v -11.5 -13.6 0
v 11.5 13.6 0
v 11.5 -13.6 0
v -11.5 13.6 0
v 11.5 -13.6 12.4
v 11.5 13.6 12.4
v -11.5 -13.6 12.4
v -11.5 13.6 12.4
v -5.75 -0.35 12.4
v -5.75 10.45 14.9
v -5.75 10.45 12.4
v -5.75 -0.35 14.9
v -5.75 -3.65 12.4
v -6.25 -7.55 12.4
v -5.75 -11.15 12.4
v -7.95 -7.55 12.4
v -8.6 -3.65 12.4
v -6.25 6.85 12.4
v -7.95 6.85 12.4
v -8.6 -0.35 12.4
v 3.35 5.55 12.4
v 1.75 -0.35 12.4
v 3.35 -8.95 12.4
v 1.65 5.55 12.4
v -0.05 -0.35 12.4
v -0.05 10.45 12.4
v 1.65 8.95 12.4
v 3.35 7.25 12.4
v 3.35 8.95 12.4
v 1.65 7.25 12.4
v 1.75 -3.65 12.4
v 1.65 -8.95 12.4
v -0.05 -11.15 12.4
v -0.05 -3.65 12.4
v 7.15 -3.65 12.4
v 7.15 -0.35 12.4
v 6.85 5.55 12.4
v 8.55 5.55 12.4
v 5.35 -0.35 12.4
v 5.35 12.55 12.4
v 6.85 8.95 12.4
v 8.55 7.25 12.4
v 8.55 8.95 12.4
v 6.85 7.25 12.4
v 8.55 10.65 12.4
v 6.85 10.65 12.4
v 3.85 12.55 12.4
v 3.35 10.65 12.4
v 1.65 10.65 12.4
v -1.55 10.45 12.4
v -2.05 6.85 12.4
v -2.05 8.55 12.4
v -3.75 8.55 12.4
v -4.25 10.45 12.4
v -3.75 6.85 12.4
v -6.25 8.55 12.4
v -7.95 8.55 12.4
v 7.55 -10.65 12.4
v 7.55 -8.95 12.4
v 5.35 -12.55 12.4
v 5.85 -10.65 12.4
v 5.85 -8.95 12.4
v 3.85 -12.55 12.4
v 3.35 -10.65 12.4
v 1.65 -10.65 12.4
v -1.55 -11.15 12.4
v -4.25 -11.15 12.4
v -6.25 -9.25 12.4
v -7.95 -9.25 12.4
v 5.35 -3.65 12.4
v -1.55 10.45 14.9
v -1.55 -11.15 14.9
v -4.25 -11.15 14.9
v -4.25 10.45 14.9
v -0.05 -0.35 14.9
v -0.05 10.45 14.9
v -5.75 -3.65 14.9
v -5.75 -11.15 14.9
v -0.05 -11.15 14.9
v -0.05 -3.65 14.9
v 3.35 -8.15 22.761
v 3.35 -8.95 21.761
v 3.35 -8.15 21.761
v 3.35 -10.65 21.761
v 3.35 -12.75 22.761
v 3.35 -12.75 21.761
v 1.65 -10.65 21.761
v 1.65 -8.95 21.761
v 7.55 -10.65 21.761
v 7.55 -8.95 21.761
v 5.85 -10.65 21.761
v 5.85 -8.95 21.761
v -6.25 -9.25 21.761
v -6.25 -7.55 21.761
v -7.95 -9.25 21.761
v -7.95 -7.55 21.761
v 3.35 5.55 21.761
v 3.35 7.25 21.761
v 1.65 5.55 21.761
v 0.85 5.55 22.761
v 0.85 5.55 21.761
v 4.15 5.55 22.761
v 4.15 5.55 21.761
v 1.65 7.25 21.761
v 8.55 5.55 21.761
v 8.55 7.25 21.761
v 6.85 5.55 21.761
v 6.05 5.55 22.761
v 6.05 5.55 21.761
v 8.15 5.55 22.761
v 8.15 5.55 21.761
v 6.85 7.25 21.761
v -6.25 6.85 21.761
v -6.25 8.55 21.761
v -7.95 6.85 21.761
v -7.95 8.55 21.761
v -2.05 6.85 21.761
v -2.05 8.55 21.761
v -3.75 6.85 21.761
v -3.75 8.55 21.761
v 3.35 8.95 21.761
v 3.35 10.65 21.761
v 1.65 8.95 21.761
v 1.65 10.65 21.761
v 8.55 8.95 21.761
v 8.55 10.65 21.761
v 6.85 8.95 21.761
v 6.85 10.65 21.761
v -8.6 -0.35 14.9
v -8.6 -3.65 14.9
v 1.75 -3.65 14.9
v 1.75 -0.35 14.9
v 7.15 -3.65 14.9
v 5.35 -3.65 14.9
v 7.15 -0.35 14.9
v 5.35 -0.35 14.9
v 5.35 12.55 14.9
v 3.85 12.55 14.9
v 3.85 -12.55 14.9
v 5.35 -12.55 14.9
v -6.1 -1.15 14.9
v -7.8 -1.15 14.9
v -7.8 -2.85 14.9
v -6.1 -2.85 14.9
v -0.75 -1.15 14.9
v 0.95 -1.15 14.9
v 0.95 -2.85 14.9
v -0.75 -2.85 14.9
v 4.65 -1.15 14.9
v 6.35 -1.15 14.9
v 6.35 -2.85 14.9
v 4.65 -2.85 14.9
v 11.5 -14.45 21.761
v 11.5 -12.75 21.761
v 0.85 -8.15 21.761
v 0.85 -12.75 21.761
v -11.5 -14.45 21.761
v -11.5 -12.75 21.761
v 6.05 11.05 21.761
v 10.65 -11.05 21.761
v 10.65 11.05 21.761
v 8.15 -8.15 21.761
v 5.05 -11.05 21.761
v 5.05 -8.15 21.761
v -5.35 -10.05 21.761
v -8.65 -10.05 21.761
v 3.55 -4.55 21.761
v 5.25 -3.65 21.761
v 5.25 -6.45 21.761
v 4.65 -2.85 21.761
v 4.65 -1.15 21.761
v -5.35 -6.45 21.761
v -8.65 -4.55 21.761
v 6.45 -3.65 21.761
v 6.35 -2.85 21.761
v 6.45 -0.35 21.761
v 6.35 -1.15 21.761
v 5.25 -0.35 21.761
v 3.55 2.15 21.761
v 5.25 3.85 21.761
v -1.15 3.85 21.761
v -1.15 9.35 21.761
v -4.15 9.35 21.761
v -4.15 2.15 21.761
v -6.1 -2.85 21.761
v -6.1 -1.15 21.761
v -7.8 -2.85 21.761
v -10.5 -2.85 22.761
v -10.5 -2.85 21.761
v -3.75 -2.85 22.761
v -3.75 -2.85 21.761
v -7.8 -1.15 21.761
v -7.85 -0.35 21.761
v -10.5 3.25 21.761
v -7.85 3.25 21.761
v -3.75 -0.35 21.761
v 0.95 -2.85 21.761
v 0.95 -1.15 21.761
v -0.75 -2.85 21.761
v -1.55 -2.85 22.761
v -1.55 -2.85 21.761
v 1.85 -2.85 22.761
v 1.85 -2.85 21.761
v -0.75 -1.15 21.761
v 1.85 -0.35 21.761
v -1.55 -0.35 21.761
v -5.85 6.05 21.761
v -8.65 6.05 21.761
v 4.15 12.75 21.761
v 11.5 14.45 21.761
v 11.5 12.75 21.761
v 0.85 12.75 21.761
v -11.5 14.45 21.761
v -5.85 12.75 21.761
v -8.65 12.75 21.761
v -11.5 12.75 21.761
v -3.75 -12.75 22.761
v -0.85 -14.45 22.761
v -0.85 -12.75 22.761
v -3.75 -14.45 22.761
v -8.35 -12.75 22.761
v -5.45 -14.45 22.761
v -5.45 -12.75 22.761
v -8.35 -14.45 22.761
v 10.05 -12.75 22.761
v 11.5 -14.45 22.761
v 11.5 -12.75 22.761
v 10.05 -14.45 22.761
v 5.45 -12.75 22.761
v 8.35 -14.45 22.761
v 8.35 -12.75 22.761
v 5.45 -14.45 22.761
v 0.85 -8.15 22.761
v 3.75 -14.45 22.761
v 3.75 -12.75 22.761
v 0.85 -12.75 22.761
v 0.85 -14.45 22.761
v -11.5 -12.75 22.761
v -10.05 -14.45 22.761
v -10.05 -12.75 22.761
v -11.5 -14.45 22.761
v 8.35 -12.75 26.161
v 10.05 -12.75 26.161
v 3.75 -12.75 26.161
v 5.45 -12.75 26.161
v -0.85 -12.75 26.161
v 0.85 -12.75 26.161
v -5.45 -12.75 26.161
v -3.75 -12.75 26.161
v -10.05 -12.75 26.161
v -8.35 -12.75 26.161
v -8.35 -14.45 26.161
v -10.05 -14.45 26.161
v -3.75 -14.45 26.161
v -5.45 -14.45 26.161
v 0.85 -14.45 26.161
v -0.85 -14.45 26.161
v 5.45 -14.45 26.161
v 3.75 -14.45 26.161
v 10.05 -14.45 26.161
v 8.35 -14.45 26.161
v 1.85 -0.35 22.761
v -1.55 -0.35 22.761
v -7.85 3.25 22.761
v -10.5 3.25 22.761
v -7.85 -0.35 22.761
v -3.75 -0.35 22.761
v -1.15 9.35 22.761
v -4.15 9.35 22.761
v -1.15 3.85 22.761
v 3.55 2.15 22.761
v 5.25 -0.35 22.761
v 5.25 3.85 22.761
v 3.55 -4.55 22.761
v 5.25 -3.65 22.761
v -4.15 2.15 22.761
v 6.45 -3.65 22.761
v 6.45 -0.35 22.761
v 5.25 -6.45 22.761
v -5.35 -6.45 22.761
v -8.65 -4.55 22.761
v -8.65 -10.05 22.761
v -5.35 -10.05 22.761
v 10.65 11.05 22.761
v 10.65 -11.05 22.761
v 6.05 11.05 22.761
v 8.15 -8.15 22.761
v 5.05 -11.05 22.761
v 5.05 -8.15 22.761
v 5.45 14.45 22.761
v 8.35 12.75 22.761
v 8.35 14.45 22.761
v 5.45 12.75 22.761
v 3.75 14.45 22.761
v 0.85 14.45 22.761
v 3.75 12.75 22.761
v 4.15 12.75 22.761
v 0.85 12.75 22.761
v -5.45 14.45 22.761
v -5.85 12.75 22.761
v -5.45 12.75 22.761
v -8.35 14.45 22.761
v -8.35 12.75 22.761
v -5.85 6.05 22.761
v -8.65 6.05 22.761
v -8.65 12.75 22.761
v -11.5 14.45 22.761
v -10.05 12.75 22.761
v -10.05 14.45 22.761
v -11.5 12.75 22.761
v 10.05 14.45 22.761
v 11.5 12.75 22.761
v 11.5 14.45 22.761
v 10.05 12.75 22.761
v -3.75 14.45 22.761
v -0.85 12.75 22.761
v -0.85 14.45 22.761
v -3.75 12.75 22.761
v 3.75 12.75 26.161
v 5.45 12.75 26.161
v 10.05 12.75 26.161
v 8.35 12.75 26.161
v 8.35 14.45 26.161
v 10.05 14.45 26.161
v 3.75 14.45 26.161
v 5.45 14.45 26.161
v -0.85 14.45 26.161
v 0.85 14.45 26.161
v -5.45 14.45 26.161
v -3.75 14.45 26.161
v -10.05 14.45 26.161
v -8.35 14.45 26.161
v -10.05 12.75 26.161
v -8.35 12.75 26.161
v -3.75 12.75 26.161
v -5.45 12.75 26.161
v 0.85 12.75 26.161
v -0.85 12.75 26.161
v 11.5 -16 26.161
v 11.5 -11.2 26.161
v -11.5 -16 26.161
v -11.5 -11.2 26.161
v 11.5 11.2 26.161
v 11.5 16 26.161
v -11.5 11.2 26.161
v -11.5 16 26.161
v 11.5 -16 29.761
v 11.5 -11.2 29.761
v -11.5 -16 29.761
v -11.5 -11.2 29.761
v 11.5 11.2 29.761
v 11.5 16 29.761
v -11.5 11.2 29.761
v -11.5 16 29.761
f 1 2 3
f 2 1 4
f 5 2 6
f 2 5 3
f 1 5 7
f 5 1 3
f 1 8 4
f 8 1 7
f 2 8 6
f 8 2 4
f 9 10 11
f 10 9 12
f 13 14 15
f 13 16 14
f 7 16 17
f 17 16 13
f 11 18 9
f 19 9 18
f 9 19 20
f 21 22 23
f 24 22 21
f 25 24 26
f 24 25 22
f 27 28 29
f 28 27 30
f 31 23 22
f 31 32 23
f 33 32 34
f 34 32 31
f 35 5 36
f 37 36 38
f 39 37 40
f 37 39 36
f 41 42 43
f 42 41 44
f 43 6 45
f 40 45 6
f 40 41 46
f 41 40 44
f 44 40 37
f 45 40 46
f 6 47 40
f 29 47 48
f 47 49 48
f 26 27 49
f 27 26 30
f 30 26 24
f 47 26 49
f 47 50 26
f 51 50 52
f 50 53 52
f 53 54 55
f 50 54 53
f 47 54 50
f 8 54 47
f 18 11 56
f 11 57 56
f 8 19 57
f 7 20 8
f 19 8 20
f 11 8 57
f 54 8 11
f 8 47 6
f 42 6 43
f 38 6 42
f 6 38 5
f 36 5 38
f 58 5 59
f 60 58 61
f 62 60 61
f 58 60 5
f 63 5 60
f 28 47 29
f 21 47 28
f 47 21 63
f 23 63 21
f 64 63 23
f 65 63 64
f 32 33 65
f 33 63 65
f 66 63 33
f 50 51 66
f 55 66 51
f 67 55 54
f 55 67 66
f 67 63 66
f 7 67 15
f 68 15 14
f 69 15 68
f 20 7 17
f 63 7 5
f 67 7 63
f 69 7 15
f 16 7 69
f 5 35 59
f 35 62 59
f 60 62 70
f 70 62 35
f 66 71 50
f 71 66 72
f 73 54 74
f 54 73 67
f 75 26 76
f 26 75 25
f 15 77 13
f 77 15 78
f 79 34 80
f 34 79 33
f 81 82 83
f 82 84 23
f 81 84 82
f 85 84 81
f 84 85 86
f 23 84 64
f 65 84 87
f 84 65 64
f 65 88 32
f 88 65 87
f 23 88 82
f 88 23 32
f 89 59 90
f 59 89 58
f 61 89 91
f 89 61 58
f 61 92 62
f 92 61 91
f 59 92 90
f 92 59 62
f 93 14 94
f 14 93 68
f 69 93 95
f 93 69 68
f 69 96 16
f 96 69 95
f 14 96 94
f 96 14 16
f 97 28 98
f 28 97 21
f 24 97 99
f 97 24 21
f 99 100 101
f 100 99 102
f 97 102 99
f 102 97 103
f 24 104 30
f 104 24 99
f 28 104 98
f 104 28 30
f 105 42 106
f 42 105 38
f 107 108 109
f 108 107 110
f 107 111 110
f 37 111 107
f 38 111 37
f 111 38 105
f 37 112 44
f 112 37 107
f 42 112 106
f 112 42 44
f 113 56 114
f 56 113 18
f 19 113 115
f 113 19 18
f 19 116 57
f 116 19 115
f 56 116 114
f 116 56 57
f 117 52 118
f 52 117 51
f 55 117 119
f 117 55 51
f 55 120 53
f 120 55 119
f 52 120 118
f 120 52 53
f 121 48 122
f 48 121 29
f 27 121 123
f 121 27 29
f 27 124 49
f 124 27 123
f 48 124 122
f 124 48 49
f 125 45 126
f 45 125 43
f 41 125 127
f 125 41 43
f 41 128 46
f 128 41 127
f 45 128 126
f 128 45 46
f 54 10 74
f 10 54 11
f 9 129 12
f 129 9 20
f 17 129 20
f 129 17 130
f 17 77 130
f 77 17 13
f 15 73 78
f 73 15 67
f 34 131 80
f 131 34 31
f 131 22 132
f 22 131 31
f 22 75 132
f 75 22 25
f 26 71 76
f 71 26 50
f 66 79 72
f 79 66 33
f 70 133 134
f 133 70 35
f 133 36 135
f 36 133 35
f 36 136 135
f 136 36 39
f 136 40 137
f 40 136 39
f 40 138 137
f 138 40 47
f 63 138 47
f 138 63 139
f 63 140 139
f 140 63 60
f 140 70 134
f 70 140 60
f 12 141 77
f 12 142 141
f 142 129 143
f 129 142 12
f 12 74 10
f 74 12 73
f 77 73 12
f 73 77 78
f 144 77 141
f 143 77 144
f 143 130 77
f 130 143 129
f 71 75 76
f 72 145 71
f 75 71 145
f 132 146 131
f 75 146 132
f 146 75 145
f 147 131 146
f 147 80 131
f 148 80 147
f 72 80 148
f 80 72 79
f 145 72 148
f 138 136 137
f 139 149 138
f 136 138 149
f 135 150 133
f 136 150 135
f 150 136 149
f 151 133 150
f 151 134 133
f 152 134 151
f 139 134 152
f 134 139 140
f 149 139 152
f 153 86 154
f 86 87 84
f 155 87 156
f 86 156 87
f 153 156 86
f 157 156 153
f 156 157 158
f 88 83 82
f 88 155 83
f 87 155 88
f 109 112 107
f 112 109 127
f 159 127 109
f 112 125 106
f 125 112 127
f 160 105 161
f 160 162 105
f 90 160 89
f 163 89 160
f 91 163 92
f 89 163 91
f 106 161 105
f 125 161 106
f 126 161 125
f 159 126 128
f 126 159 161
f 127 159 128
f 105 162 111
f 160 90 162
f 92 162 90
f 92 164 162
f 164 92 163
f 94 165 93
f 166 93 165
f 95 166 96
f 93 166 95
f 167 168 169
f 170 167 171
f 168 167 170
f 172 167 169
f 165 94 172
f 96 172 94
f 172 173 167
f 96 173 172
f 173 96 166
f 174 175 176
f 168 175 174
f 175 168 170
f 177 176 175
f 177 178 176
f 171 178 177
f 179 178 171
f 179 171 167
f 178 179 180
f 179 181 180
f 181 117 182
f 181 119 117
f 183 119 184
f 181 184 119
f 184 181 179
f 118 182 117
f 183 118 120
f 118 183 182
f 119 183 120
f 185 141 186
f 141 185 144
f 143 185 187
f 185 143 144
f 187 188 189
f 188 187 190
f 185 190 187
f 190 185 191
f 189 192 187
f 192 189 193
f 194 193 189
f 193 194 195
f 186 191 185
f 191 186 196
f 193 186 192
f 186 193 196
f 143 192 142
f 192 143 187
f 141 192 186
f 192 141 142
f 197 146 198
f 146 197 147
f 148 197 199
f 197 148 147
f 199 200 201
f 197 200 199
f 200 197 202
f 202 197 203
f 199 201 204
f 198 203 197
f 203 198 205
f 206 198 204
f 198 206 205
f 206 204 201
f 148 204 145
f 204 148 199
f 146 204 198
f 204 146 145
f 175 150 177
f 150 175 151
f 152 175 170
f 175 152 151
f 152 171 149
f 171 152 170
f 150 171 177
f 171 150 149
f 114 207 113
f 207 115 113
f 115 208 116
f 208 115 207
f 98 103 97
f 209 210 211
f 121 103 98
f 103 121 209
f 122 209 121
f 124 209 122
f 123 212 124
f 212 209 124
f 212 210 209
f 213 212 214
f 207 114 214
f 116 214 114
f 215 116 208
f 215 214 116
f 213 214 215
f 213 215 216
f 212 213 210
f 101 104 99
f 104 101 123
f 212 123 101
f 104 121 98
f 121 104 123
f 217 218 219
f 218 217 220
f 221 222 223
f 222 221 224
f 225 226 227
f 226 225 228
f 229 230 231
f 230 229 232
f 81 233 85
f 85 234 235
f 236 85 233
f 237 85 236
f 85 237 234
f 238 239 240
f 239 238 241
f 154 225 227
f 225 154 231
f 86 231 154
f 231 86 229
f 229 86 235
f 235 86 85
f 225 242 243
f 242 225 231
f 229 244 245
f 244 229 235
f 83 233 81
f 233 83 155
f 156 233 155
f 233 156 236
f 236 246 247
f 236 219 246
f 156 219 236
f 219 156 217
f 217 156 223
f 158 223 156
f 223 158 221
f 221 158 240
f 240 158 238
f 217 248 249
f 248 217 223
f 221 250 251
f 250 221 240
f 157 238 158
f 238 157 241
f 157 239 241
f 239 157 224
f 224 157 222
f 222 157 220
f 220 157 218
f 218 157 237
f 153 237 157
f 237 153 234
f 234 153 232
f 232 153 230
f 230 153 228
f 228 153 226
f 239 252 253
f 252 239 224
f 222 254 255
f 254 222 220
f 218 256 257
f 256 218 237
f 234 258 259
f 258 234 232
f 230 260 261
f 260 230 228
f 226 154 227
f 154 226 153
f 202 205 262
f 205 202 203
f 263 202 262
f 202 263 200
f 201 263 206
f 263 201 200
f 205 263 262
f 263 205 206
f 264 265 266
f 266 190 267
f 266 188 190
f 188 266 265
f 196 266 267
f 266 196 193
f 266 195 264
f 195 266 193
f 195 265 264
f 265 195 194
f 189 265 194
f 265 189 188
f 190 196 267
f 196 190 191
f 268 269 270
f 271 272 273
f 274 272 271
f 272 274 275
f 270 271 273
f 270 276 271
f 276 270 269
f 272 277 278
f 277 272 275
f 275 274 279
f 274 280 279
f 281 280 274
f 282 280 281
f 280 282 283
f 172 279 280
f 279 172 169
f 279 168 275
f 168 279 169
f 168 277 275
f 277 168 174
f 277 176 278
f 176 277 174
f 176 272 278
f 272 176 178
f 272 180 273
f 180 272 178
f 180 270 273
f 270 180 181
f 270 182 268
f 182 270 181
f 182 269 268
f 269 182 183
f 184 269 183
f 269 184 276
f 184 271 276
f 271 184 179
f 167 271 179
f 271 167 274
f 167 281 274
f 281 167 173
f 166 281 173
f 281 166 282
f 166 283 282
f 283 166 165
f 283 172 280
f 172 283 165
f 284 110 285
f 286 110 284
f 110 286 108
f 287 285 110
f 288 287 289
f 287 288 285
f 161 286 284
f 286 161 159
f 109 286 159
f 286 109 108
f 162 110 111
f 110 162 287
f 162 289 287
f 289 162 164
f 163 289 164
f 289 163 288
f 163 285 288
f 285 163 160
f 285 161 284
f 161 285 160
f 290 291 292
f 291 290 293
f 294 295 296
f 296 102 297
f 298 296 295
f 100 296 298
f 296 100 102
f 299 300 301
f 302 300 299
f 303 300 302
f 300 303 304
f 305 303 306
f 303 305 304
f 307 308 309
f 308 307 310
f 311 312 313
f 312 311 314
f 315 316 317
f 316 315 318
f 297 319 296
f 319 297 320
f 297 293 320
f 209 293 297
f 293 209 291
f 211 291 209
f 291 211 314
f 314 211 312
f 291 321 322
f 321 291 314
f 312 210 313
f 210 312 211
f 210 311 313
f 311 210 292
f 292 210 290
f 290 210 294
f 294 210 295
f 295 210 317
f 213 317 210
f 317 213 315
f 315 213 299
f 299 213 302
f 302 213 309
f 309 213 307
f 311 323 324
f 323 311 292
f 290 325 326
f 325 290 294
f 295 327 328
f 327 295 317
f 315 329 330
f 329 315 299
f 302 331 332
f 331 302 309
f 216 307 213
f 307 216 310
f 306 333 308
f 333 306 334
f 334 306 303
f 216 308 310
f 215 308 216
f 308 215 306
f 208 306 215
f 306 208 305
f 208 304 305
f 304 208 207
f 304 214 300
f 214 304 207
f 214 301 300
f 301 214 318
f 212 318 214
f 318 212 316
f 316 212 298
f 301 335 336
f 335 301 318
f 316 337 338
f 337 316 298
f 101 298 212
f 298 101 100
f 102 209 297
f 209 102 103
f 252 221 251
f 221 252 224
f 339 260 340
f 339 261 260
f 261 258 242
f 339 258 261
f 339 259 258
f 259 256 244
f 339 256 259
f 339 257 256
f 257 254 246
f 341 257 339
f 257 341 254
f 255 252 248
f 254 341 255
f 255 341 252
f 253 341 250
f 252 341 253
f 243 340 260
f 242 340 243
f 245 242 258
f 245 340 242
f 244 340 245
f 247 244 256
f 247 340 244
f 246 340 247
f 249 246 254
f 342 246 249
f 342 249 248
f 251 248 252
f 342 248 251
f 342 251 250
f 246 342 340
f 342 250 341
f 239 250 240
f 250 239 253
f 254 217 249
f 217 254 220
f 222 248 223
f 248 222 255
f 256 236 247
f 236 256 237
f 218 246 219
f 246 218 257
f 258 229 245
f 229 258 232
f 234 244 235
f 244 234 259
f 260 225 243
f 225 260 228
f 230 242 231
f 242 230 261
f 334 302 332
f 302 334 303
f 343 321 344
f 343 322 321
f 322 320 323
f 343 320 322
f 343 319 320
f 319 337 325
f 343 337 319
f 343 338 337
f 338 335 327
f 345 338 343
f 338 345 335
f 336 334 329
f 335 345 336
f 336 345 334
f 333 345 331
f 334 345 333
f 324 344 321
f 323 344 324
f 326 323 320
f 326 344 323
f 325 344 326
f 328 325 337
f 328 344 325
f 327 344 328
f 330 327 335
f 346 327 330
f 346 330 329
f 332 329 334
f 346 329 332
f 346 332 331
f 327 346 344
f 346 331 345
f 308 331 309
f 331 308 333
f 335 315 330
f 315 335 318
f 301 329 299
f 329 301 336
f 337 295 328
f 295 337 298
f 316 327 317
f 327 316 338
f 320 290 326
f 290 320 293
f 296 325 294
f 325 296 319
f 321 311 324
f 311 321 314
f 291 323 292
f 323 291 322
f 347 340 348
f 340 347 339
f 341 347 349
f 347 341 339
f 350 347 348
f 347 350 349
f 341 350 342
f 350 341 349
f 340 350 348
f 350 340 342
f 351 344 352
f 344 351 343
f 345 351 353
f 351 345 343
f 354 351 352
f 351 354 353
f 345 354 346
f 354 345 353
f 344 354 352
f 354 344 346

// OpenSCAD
// Generated by SolidPython 0.4.2 on 2020-09-29 23:20:05
//!OpenSCAD

scale(v = 0.0100000000) {
	translate(v = [-1150, -1360, 0]) {
		union() {
			color(c = [0.4000000000, 0.4000000000, 0.4000000000]) {
				translate(v = [0, 0, 0]) {
					linear_extrude(height = 1000.0000000000) {
						polygon(paths = [[0, 1, 2, 3]], points = [[0, 0], [0, 2720], [2300, 2720], [2300, 0]]);
					}
				}
			}
			color(c = [0.2000000000, 0.6000000000, 0.2000000000]) {
				translate(v = [0, 0, 1000.0000000000]) {
					linear_extrude(height = 120.0000000000) {
						polygon(paths = [[0, 1, 2, 3]], points = [[0, 1305], [0, 2720], [2300, 2720], [2300, 1305]]);
					}
				}
			}
			color(c = [0.4000000000, 0.4000000000, 0.4000000000]) {
				translate(v = [0, 0, 1000.0000000000]) {
					linear_extrude(height = 120.0000000000) {
						polygon(paths = [[0, 1, 2, 3]], points = [[0, 0], [0, 1305], [2300, 1305], [2300, 0]]);
					}
				}
			}
			color(c = [0.9000000000, 0.6000000000, 0.6000000000]) {
				translate(v = [0, 0, 1120.0000000000]) {
					linear_extrude(height = 120.0000000000) {
						polygon(paths = [[0, 1, 2, 3]], points = [[295, 1855], [295, 2275], [575, 2275], [575, 1855]]);
					}
				}
			}
			color(c = [0.9000000000, 0.6000000000, 0.6000000000]) {
				translate(v = [0, 0, 1120.0000000000]) {
					linear_extrude(height = 120.0000000000) {
						polygon(paths = [[0, 1, 2, 3]], points = [[725, 1855], [725, 2275], [995, 2275], [995, 1855]]);
					}
				}
			}
			color(c = [0.9000000000, 0.6000000000, 0.6000000000]) {
				translate(v = [0, 0, 1120.0000000000]) {
					linear_extrude(height = 120.0000000000) {
						polygon(paths = [[0, 1, 2, 3, 4, 5, 6, 7]], points = [[1225, 1485], [1225, 1855], [1145, 1855], [1145, 2275], [1275, 2275], [1275, 2485], [1535, 2485], [1535, 1485]]);
					}
				}
			}
			color(c = [0.9000000000, 0.6000000000, 0.6000000000]) {
				translate(v = [0, 0, 1120.0000000000]) {
					linear_extrude(height = 120.0000000000) {
						polygon(paths = [[0, 1, 2, 3]], points = [[1685, 1485], [1685, 2485], [2160, 2485], [2160, 1485]]);
					}
				}
			}
			color(c = [0.9000000000, 0.6000000000, 0.9000000000]) {
				translate(v = [0, 0, 1120.0000000000]) {
					linear_extrude(height = 120.0000000000) {
						polygon(paths = [[0, 1, 2, 3]], points = [[295, 375], [295, 795], [575, 795], [575, 375]]);
					}
				}
			}
			color(c = [0.9000000000, 0.6000000000, 0.9000000000]) {
				translate(v = [0, 0, 1120.0000000000]) {
					linear_extrude(height = 120.0000000000) {
						polygon(paths = [[0, 1, 2, 3]], points = [[725, 375], [725, 795], [995, 795], [995, 375]]);
					}
				}
			}
			color(c = [0.9000000000, 0.6000000000, 0.9000000000]) {
				translate(v = [0, 0, 1120.0000000000]) {
					linear_extrude(height = 120.0000000000) {
						polygon(paths = [[0, 1, 2, 3, 4, 5, 6, 7]], points = [[1275, 235], [1275, 375], [1145, 375], [1145, 795], [1275, 795], [1275, 885], [1535, 885], [1535, 235]]);
					}
				}
			}
			color(c = [0.9000000000, 0.6000000000, 0.9000000000]) {
				translate(v = [0, 0, 1120.0000000000]) {
					linear_extrude(height = 120.0000000000) {
						polygon(paths = [[0, 1, 2, 3]], points = [[1685, 235], [1685, 885], [1965, 885], [1965, 235]]);
					}
				}
			}
			color(c = [0.2000000000, 0.6000000000, 0.2000000000]) {
				translate(v = [0, 0, 1120.0000000000]) {
					linear_extrude(height = 120.0000000000) {
						difference() {
							polygon(paths = [[0, 1, 2, 3]], points = [[0, 1305], [0, 2720], [2300, 2720], [2300, 1305]]);
							polygon(paths = [[0, 1, 2, 3]], points = [[1685, 1485], [2160, 1485], [2160, 2485], [1685, 2485]]);
							polygon(paths = [[0, 1, 2, 3]], points = [[295, 1855], [575, 1855], [575, 2275], [295, 2275]]);
							polygon(paths = [[0, 1, 2, 3]], points = [[725, 1855], [995, 1855], [995, 2275], [725, 2275]]);
							polygon(paths = [[0, 1, 2, 3, 4, 5, 6, 7]], points = [[1225, 1485], [1535, 1485], [1535, 2485], [1275, 2485], [1275, 2275], [1145, 2275], [1145, 1855], [1225, 1855]]);
						}
					}
				}
			}
			color(c = [0.4000000000, 0.4000000000, 0.4000000000]) {
				translate(v = [0, 0, 1120.0000000000]) {
					linear_extrude(height = 120.0000000000) {
						difference() {
							polygon(paths = [[0, 1, 2, 3]], points = [[0, 0], [0, 1305], [2300, 1305], [2300, 0]]);
							polygon(paths = [[0, 1, 2, 3]], points = [[1685, 235], [1965, 235], [1965, 885], [1685, 885]]);
							polygon(paths = [[0, 1, 2, 3]], points = [[295, 375], [575, 375], [575, 795], [295, 795]]);
							polygon(paths = [[0, 1, 2, 3]], points = [[725, 375], [995, 375], [995, 795], [725, 795]]);
							polygon(paths = [[0, 1, 2, 3, 4, 5, 6, 7]], points = [[1275, 235], [1535, 235], [1535, 885], [1275, 885], [1275, 795], [1145, 795], [1145, 375], [1275, 375]]);
						}
					}
				}
			}
			color(c = [0.1000000000, 0.1000000000, 0.1000000000]) {
				translate(v = [0, 0, 1240.0000000000]) {
					linear_extrude(height = 70.0000000000) {
						polygon(paths = [[0, 1, 2, 3]], points = [[1315, 295], [1315, 465], [1485, 465], [1485, 295]]);
					}
				}
			}
			color(c = [0.1000000000, 0.1000000000, 0.1000000000]) {
				translate(v = [0, 0, 1240.0000000000]) {
					linear_extrude(height = 70.0000000000) {
						polygon(paths = [[0, 1, 2, 3]], points = [[1735, 295], [1735, 465], [1905, 465], [1905, 295]]);
					}
				}
			}
			color(c = [0.1000000000, 0.1000000000, 0.1000000000]) {
				translate(v = [0, 0, 1240.0000000000]) {
					linear_extrude(height = 70.0000000000) {
						polygon(paths = [[0, 1, 2, 3]], points = [[355, 435], [355, 605], [525, 605], [525, 435]]);
					}
				}
			}
			color(c = [0.1000000000, 0.1000000000, 0.1000000000]) {
				translate(v = [0, 0, 1240.0000000000]) {
					linear_extrude(height = 70.0000000000) {
						polygon(paths = [[0, 1, 2, 3]], points = [[1315, 1915], [1315, 2085], [1485, 2085], [1485, 1915]]);
					}
				}
			}
			color(c = [0.1000000000, 0.1000000000, 0.1000000000]) {
				translate(v = [0, 0, 1240.0000000000]) {
					linear_extrude(height = 70.0000000000) {
						polygon(paths = [[0, 1, 2, 3]], points = [[1835, 1915], [1835, 2085], [2005, 2085], [2005, 1915]]);
					}
				}
			}
			color(c = [0.1000000000, 0.1000000000, 0.1000000000]) {
				translate(v = [0, 0, 1240.0000000000]) {
					linear_extrude(height = 70.0000000000) {
						polygon(paths = [[0, 1, 2, 3]], points = [[355, 2045], [355, 2215], [525, 2215], [525, 2045]]);
					}
				}
			}
			color(c = [0.1000000000, 0.1000000000, 0.1000000000]) {
				translate(v = [0, 0, 1240.0000000000]) {
					linear_extrude(height = 70.0000000000) {
						polygon(paths = [[0, 1, 2, 3]], points = [[775, 2045], [775, 2215], [945, 2215], [945, 2045]]);
					}
				}
			}
			color(c = [0.1000000000, 0.1000000000, 0.1000000000]) {
				translate(v = [0, 0, 1240.0000000000]) {
					linear_extrude(height = 70.0000000000) {
						polygon(paths = [[0, 1, 2, 3]], points = [[1315, 2255], [1315, 2425], [1485, 2425], [1485, 2255]]);
					}
				}
			}
			color(c = [0.1000000000, 0.1000000000, 0.1000000000]) {
				translate(v = [0, 0, 1240.0000000000]) {
					linear_extrude(height = 70.0000000000) {
						polygon(paths = [[0, 1, 2, 3]], points = [[1835, 2255], [1835, 2425], [2005, 2425], [2005, 2255]]);
					}
				}
			}
			color(c = [1.0000000000, 1.0000000000, 1.0000000000]) {
				translate(v = [0, 0, 1240.0000000000]) {
					linear_extrude(height = 70.0000000000) {
						polygon(paths = [[0, 1, 2, 3, 4, 5, 6, 7]], points = [[575, 245], [575, 995], [290, 995], [290, 1325], [575, 1325], [575, 2405], [725, 2405], [725, 245]]);
					}
				}
			}
			color(c = [1.0000000000, 1.0000000000, 1.0000000000]) {
				translate(v = [0, 0, 1240.0000000000]) {
					linear_extrude(height = 70.0000000000) {
						polygon(paths = [[0, 1, 2, 3, 4, 5, 6, 7]], points = [[995, 245], [995, 2405], [1145, 2405], [1145, 1325], [1325, 1325], [1325, 995], [1145, 995], [1145, 245]]);
					}
				}
			}
			color(c = [1.0000000000, 1.0000000000, 1.0000000000]) {
				translate(v = [0, 0, 1240.0000000000]) {
					linear_extrude(height = 70.0000000000) {
						polygon(paths = [[0, 1, 2, 3, 4, 5, 6, 7]], points = [[1535, 105], [1535, 2615], [1685, 2615], [1685, 1325], [1865, 1325], [1865, 995], [1685, 995], [1685, 105]]);
					}
				}
			}
			color(c = [0.1000000000, 0.1000000000, 0.1000000000]) {
				translate(v = [0, 0, 1310.0000000000]) {
					linear_extrude(height = 180.0000000000) {
						polygon(paths = [[0, 1, 2, 3]], points = [[1315, 295], [1315, 465], [1485, 465], [1485, 295]]);
					}
				}
			}
			color(c = [0.1000000000, 0.1000000000, 0.1000000000]) {
				translate(v = [0, 0, 1310.0000000000]) {
					linear_extrude(height = 180.0000000000) {
						polygon(paths = [[0, 1, 2, 3]], points = [[1735, 295], [1735, 465], [1905, 465], [1905, 295]]);
					}
				}
			}
			color(c = [0.1000000000, 0.1000000000, 0.1000000000]) {
				translate(v = [0, 0, 1310.0000000000]) {
					linear_extrude(height = 180.0000000000) {
						polygon(paths = [[0, 1, 2, 3]], points = [[355, 435], [355, 605], [525, 605], [525, 435]]);
					}
				}
			}
			color(c = [0.1000000000, 0.1000000000, 0.1000000000]) {
				translate(v = [0, 0, 1310.0000000000]) {
					linear_extrude(height = 180.0000000000) {
						polygon(paths = [[0, 1, 2, 3]], points = [[1315, 1915], [1315, 2085], [1485, 2085], [1485, 1915]]);
					}
				}
			}
			color(c = [0.1000000000, 0.1000000000, 0.1000000000]) {
				translate(v = [0, 0, 1310.0000000000]) {
					linear_extrude(height = 180.0000000000) {
						polygon(paths = [[0, 1, 2, 3]], points = [[1835, 1915], [1835, 2085], [2005, 2085], [2005, 1915]]);
					}
				}
			}
			color(c = [0.1000000000, 0.1000000000, 0.1000000000]) {
				translate(v = [0, 0, 1310.0000000000]) {
					linear_extrude(height = 180.0000000000) {
						polygon(paths = [[0, 1, 2, 3]], points = [[355, 2045], [355, 2215], [525, 2215], [525, 2045]]);
					}
				}
			}
			color(c = [0.1000000000, 0.1000000000, 0.1000000000]) {
				translate(v = [0, 0, 1310.0000000000]) {
					linear_extrude(height = 180.0000000000) {
						polygon(paths = [[0, 1, 2, 3]], points = [[775, 2045], [775, 2215], [945, 2215], [945, 2045]]);
					}
				}
			}
			color(c = [0.1000000000, 0.1000000000, 0.1000000000]) {
				translate(v = [0, 0, 1310.0000000000]) {
					linear_extrude(height = 180.0000000000) {
						polygon(paths = [[0, 1, 2, 3]], points = [[1315, 2255], [1315, 2425], [1485, 2425], [1485, 2255]]);
					}
				}
			}
			color(c = [0.1000000000, 0.1000000000, 0.1000000000]) {
				translate(v = [0, 0, 1310.0000000000]) {
					linear_extrude(height = 180.0000000000) {
						polygon(paths = [[0, 1, 2, 3]], points = [[1835, 2255], [1835, 2425], [2005, 2425], [2005, 2255]]);
					}
				}
			}
			color(c = [0.7000000000, 0, 0]) {
				translate(v = [0, 0, 1310.0000000000]) {
					linear_extrude(height = 180.0000000000) {
						polygon(paths = [[0, 1, 2, 3, 4, 5, 6, 7]], points = [[575, 245], [575, 995], [290, 995], [290, 1325], [575, 1325], [575, 2405], [725, 2405], [725, 245]]);
					}
				}
			}
			color(c = [0.7000000000, 0, 0]) {
				translate(v = [0, 0, 1310.0000000000]) {
					linear_extrude(height = 180.0000000000) {
						polygon(paths = [[0, 1, 2, 3, 4, 5, 6, 7]], points = [[995, 245], [995, 2405], [1145, 2405], [1145, 1325], [1325, 1325], [1325, 995], [1145, 995], [1145, 245]]);
					}
				}
			}
			color(c = [0.7000000000, 0, 0]) {
				translate(v = [0, 0, 1310.0000000000]) {
					linear_extrude(height = 180.0000000000) {
						polygon(paths = [[0, 1, 2, 3, 4, 5, 6, 7]], points = [[1535, 105], [1535, 2615], [1685, 2615], [1685, 1325], [1865, 1325], [1865, 995], [1685, 995], [1685, 105]]);
					}
				}
			}
			color(c = [0.1000000000, 0.1000000000, 0.1000000000]) {
				translate(v = [0, 0, 1490.0000000000]) {
					linear_extrude(height = 686.1000000000) {
						polygon(paths = [[0, 1, 2, 3]], points = [[1315, 295], [1315, 465], [1485, 465], [1485, 295]]);
					}
				}
			}
			color(c = [0.1000000000, 0.1000000000, 0.1000000000]) {
				translate(v = [0, 0, 1490.0000000000]) {
					linear_extrude(height = 686.1000000000) {
						polygon(paths = [[0, 1, 2, 3]], points = [[1735, 295], [1735, 465], [1905, 465], [1905, 295]]);
					}
				}
			}
			color(c = [0.1000000000, 0.1000000000, 0.1000000000]) {
				translate(v = [0, 0, 1490.0000000000]) {
					linear_extrude(height = 686.1000000000) {
						polygon(paths = [[0, 1, 2, 3]], points = [[355, 435], [355, 605], [525, 605], [525, 435]]);
					}
				}
			}
			color(c = [0.1000000000, 0.1000000000, 0.1000000000]) {
				translate(v = [0, 0, 1490.0000000000]) {
					linear_extrude(height = 686.1000000000) {
						polygon(paths = [[0, 1, 2, 3]], points = [[370, 1075], [370, 1245], [540, 1245], [540, 1075]]);
					}
				}
			}
			color(c = [0.1000000000, 0.1000000000, 0.1000000000]) {
				translate(v = [0, 0, 1490.0000000000]) {
					linear_extrude(height = 686.1000000000) {
						polygon(paths = [[0, 1, 2, 3]], points = [[1075, 1075], [1075, 1245], [1245, 1245], [1245, 1075]]);
					}
				}
			}
			color(c = [0.1000000000, 0.1000000000, 0.1000000000]) {
				translate(v = [0, 0, 1490.0000000000]) {
					linear_extrude(height = 686.1000000000) {
						polygon(paths = [[0, 1, 2, 3]], points = [[1615, 1075], [1615, 1245], [1785, 1245], [1785, 1075]]);
					}
				}
			}
			color(c = [0.1000000000, 0.1000000000, 0.1000000000]) {
				translate(v = [0, 0, 1490.0000000000]) {
					linear_extrude(height = 686.1000000000) {
						polygon(paths = [[0, 1, 2, 3]], points = [[1315, 1915], [1315, 2085], [1485, 2085], [1485, 1915]]);
					}
				}
			}
			color(c = [0.1000000000, 0.1000000000, 0.1000000000]) {
				translate(v = [0, 0, 1490.0000000000]) {
					linear_extrude(height = 686.1000000000) {
						polygon(paths = [[0, 1, 2, 3]], points = [[1835, 1915], [1835, 2085], [2005, 2085], [2005, 1915]]);
					}
				}
			}
			color(c = [0.1000000000, 0.1000000000, 0.1000000000]) {
				translate(v = [0, 0, 1490.0000000000]) {
					linear_extrude(height = 686.1000000000) {
						polygon(paths = [[0, 1, 2, 3]], points = [[355, 2045], [355, 2215], [525, 2215], [525, 2045]]);
					}
				}
			}
			color(c = [0.1000000000, 0.1000000000, 0.1000000000]) {
				translate(v = [0, 0, 1490.0000000000]) {
					linear_extrude(height = 686.1000000000) {
						polygon(paths = [[0, 1, 2, 3]], points = [[775, 2045], [775, 2215], [945, 2215], [945, 2045]]);
					}
				}
			}
			color(c = [0.1000000000, 0.1000000000, 0.1000000000]) {
				translate(v = [0, 0, 1490.0000000000]) {
					linear_extrude(height = 686.1000000000) {
						polygon(paths = [[0, 1, 2, 3]], points = [[1315, 2255], [1315, 2425], [1485, 2425], [1485, 2255]]);
					}
				}
			}
			color(c = [0.1000000000, 0.1000000000, 0.1000000000]) {
				translate(v = [0, 0, 1490.0000000000]) {
					linear_extrude(height = 686.1000000000) {
						polygon(paths = [[0, 1, 2, 3]], points = [[1835, 2255], [1835, 2425], [2005, 2425], [2005, 2255]]);
					}
				}
			}
			color(c = [0.9000000000, 0.6000000000, 0.6000000000]) {
				translate(v = [0, 0, 2176.1000000000]) {
					linear_extrude(height = 100.0000000000) {
						polygon(paths = [[0, 1, 2, 3, 4, 5, 6, 7]], points = [[0, -85], [0, 85], [1235, 85], [1235, 545], [1485, 545], [1485, 85], [2300, 85], [2300, -85]]);
					}
				}
			}
			color(c = [0.9000000000, 0.6000000000, 0.6000000000]) {
				translate(v = [0, 0, 2176.1000000000]) {
					linear_extrude(height = 100.0000000000) {
						polygon(paths = [[0, 1, 2, 3]], points = [[995, 1075], [995, 1325], [1335, 1325], [1335, 1075]]);
					}
				}
			}
			color(c = [0.9000000000, 0.6000000000, 0.6000000000]) {
				translate(v = [0, 0, 2176.1000000000]) {
					linear_extrude(height = 100.0000000000) {
						polygon(paths = [[0, 1, 2, 3, 4, 5]], points = [[100, 1075], [100, 1685], [365, 1685], [365, 1325], [775, 1325], [775, 1075]]);
					}
				}
			}
			color(c = [0.9000000000, 0.6000000000, 0.6000000000]) {
				translate(v = [0, 0, 2176.1000000000]) {
					linear_extrude(height = 100.0000000000) {
						polygon(paths = [[0, 1, 2, 3, 4, 5, 6, 7, 8, 9, 10, 11, 12, 13, 14, 15]], points = [[285, 355], [285, 905], [1505, 905], [1505, 1575], [735, 1575], [735, 2295], [1035, 2295], [1035, 1745], [1675, 1745], [1675, 1325], [1795, 1325], [1795, 995], [1675, 995], [1675, 715], [615, 715], [615, 355]]);
					}
				}
			}
			color(c = [0.9000000000, 0.6000000000, 0.6000000000]) {
				translate(v = [0, 0, 2176.1000000000]) {
					linear_extrude(height = 100.0000000000) {
						polygon(paths = [[0, 1, 2, 3, 4, 5, 6, 7]], points = [[1655, 255], [1655, 545], [1965, 545], [1965, 1915], [1755, 1915], [1755, 2465], [2215, 2465], [2215, 255]]);
					}
				}
			}
			color(c = [0.9000000000, 0.6000000000, 0.6000000000]) {
				translate(v = [0, 0, 2176.1000000000]) {
					linear_extrude(height = 100.0000000000) {
						polygon(paths = [[0, 1, 2, 3, 4, 5, 6, 7, 8, 9, 10, 11]], points = [[1235, 1915], [1235, 2635], [565, 2635], [565, 1965], [285, 1965], [285, 2635], [0, 2635], [0, 2805], [2300, 2805], [2300, 2635], [1565, 2635], [1565, 1915]]);
					}
				}
			}
			color(c = [0.5000000000, 0.5000000000, 0.5000000000]) {
				translate(v = [0, 0, 2276.1000000000]) {
					linear_extrude(height = 340.0000000000) {
						polygon(paths = [[0, 1, 2, 3]], points = [[145, -85], [145, 85], [315, 85], [315, -85]]);
					}
				}
			}
			color(c = [0.5000000000, 0.5000000000, 0.5000000000]) {
				translate(v = [0, 0, 2276.1000000000]) {
					linear_extrude(height = 340.0000000000) {
						polygon(paths = [[0, 1, 2, 3]], points = [[605, -85], [605, 85], [775, 85], [775, -85]]);
					}
				}
			}
			color(c = [0.5000000000, 0.5000000000, 0.5000000000]) {
				translate(v = [0, 0, 2276.1000000000]) {
					linear_extrude(height = 340.0000000000) {
						polygon(paths = [[0, 1, 2, 3]], points = [[1065, -85], [1065, 85], [1235, 85], [1235, -85]]);
					}
				}
			}
			color(c = [0.5000000000, 0.5000000000, 0.5000000000]) {
				translate(v = [0, 0, 2276.1000000000]) {
					linear_extrude(height = 340.0000000000) {
						polygon(paths = [[0, 1, 2, 3]], points = [[1525, -85], [1525, 85], [1695, 85], [1695, -85]]);
					}
				}
			}
			color(c = [0.5000000000, 0.5000000000, 0.5000000000]) {
				translate(v = [0, 0, 2276.1000000000]) {
					linear_extrude(height = 340.0000000000) {
						polygon(paths = [[0, 1, 2, 3]], points = [[1985, -85], [1985, 85], [2155, 85], [2155, -85]]);
					}
				}
			}
			color(c = [0.5000000000, 0.5000000000, 0.5000000000]) {
				translate(v = [0, 0, 2276.1000000000]) {
					linear_extrude(height = 340.0000000000) {
						polygon(paths = [[0, 1, 2, 3]], points = [[145, 2635], [145, 2805], [315, 2805], [315, 2635]]);
					}
				}
			}
			color(c = [0.5000000000, 0.5000000000, 0.5000000000]) {
				translate(v = [0, 0, 2276.1000000000]) {
					linear_extrude(height = 340.0000000000) {
						polygon(paths = [[0, 1, 2, 3]], points = [[605, 2635], [605, 2805], [775, 2805], [775, 2635]]);
					}
				}
			}
			color(c = [0.5000000000, 0.5000000000, 0.5000000000]) {
				translate(v = [0, 0, 2276.1000000000]) {
					linear_extrude(height = 340.0000000000) {
						polygon(paths = [[0, 1, 2, 3]], points = [[1065, 2635], [1065, 2805], [1235, 2805], [1235, 2635]]);
					}
				}
			}
			color(c = [0.5000000000, 0.5000000000, 0.5000000000]) {
				translate(v = [0, 0, 2276.1000000000]) {
					linear_extrude(height = 340.0000000000) {
						polygon(paths = [[0, 1, 2, 3]], points = [[1525, 2635], [1525, 2805], [1695, 2805], [1695, 2635]]);
					}
				}
			}
			color(c = [0.5000000000, 0.5000000000, 0.5000000000]) {
				translate(v = [0, 0, 2276.1000000000]) {
					linear_extrude(height = 340.0000000000) {
						polygon(paths = [[0, 1, 2, 3]], points = [[1985, 2635], [1985, 2805], [2155, 2805], [2155, 2635]]);
					}
				}
			}
			color(c = [0.3000000000, 0.3000000000, 1]) {
				translate(v = [0, 0, 2616.1000000000]) {
					linear_extrude(height = 360.0000000000) {
						polygon(paths = [[0, 1, 2, 3]], points = [[0, -240], [0, 240], [2300, 240], [2300, -240]]);
					}
				}
			}
			color(c = [0.3000000000, 0.3000000000, 1]) {
				translate(v = [0, 0, 2616.1000000000]) {
					linear_extrude(height = 360.0000000000) {
						polygon(paths = [[0, 1, 2, 3]], points = [[0, 2480], [0, 2960], [2300, 2960], [2300, 2480]]);
					}
				}
			}
		}
	}
}
